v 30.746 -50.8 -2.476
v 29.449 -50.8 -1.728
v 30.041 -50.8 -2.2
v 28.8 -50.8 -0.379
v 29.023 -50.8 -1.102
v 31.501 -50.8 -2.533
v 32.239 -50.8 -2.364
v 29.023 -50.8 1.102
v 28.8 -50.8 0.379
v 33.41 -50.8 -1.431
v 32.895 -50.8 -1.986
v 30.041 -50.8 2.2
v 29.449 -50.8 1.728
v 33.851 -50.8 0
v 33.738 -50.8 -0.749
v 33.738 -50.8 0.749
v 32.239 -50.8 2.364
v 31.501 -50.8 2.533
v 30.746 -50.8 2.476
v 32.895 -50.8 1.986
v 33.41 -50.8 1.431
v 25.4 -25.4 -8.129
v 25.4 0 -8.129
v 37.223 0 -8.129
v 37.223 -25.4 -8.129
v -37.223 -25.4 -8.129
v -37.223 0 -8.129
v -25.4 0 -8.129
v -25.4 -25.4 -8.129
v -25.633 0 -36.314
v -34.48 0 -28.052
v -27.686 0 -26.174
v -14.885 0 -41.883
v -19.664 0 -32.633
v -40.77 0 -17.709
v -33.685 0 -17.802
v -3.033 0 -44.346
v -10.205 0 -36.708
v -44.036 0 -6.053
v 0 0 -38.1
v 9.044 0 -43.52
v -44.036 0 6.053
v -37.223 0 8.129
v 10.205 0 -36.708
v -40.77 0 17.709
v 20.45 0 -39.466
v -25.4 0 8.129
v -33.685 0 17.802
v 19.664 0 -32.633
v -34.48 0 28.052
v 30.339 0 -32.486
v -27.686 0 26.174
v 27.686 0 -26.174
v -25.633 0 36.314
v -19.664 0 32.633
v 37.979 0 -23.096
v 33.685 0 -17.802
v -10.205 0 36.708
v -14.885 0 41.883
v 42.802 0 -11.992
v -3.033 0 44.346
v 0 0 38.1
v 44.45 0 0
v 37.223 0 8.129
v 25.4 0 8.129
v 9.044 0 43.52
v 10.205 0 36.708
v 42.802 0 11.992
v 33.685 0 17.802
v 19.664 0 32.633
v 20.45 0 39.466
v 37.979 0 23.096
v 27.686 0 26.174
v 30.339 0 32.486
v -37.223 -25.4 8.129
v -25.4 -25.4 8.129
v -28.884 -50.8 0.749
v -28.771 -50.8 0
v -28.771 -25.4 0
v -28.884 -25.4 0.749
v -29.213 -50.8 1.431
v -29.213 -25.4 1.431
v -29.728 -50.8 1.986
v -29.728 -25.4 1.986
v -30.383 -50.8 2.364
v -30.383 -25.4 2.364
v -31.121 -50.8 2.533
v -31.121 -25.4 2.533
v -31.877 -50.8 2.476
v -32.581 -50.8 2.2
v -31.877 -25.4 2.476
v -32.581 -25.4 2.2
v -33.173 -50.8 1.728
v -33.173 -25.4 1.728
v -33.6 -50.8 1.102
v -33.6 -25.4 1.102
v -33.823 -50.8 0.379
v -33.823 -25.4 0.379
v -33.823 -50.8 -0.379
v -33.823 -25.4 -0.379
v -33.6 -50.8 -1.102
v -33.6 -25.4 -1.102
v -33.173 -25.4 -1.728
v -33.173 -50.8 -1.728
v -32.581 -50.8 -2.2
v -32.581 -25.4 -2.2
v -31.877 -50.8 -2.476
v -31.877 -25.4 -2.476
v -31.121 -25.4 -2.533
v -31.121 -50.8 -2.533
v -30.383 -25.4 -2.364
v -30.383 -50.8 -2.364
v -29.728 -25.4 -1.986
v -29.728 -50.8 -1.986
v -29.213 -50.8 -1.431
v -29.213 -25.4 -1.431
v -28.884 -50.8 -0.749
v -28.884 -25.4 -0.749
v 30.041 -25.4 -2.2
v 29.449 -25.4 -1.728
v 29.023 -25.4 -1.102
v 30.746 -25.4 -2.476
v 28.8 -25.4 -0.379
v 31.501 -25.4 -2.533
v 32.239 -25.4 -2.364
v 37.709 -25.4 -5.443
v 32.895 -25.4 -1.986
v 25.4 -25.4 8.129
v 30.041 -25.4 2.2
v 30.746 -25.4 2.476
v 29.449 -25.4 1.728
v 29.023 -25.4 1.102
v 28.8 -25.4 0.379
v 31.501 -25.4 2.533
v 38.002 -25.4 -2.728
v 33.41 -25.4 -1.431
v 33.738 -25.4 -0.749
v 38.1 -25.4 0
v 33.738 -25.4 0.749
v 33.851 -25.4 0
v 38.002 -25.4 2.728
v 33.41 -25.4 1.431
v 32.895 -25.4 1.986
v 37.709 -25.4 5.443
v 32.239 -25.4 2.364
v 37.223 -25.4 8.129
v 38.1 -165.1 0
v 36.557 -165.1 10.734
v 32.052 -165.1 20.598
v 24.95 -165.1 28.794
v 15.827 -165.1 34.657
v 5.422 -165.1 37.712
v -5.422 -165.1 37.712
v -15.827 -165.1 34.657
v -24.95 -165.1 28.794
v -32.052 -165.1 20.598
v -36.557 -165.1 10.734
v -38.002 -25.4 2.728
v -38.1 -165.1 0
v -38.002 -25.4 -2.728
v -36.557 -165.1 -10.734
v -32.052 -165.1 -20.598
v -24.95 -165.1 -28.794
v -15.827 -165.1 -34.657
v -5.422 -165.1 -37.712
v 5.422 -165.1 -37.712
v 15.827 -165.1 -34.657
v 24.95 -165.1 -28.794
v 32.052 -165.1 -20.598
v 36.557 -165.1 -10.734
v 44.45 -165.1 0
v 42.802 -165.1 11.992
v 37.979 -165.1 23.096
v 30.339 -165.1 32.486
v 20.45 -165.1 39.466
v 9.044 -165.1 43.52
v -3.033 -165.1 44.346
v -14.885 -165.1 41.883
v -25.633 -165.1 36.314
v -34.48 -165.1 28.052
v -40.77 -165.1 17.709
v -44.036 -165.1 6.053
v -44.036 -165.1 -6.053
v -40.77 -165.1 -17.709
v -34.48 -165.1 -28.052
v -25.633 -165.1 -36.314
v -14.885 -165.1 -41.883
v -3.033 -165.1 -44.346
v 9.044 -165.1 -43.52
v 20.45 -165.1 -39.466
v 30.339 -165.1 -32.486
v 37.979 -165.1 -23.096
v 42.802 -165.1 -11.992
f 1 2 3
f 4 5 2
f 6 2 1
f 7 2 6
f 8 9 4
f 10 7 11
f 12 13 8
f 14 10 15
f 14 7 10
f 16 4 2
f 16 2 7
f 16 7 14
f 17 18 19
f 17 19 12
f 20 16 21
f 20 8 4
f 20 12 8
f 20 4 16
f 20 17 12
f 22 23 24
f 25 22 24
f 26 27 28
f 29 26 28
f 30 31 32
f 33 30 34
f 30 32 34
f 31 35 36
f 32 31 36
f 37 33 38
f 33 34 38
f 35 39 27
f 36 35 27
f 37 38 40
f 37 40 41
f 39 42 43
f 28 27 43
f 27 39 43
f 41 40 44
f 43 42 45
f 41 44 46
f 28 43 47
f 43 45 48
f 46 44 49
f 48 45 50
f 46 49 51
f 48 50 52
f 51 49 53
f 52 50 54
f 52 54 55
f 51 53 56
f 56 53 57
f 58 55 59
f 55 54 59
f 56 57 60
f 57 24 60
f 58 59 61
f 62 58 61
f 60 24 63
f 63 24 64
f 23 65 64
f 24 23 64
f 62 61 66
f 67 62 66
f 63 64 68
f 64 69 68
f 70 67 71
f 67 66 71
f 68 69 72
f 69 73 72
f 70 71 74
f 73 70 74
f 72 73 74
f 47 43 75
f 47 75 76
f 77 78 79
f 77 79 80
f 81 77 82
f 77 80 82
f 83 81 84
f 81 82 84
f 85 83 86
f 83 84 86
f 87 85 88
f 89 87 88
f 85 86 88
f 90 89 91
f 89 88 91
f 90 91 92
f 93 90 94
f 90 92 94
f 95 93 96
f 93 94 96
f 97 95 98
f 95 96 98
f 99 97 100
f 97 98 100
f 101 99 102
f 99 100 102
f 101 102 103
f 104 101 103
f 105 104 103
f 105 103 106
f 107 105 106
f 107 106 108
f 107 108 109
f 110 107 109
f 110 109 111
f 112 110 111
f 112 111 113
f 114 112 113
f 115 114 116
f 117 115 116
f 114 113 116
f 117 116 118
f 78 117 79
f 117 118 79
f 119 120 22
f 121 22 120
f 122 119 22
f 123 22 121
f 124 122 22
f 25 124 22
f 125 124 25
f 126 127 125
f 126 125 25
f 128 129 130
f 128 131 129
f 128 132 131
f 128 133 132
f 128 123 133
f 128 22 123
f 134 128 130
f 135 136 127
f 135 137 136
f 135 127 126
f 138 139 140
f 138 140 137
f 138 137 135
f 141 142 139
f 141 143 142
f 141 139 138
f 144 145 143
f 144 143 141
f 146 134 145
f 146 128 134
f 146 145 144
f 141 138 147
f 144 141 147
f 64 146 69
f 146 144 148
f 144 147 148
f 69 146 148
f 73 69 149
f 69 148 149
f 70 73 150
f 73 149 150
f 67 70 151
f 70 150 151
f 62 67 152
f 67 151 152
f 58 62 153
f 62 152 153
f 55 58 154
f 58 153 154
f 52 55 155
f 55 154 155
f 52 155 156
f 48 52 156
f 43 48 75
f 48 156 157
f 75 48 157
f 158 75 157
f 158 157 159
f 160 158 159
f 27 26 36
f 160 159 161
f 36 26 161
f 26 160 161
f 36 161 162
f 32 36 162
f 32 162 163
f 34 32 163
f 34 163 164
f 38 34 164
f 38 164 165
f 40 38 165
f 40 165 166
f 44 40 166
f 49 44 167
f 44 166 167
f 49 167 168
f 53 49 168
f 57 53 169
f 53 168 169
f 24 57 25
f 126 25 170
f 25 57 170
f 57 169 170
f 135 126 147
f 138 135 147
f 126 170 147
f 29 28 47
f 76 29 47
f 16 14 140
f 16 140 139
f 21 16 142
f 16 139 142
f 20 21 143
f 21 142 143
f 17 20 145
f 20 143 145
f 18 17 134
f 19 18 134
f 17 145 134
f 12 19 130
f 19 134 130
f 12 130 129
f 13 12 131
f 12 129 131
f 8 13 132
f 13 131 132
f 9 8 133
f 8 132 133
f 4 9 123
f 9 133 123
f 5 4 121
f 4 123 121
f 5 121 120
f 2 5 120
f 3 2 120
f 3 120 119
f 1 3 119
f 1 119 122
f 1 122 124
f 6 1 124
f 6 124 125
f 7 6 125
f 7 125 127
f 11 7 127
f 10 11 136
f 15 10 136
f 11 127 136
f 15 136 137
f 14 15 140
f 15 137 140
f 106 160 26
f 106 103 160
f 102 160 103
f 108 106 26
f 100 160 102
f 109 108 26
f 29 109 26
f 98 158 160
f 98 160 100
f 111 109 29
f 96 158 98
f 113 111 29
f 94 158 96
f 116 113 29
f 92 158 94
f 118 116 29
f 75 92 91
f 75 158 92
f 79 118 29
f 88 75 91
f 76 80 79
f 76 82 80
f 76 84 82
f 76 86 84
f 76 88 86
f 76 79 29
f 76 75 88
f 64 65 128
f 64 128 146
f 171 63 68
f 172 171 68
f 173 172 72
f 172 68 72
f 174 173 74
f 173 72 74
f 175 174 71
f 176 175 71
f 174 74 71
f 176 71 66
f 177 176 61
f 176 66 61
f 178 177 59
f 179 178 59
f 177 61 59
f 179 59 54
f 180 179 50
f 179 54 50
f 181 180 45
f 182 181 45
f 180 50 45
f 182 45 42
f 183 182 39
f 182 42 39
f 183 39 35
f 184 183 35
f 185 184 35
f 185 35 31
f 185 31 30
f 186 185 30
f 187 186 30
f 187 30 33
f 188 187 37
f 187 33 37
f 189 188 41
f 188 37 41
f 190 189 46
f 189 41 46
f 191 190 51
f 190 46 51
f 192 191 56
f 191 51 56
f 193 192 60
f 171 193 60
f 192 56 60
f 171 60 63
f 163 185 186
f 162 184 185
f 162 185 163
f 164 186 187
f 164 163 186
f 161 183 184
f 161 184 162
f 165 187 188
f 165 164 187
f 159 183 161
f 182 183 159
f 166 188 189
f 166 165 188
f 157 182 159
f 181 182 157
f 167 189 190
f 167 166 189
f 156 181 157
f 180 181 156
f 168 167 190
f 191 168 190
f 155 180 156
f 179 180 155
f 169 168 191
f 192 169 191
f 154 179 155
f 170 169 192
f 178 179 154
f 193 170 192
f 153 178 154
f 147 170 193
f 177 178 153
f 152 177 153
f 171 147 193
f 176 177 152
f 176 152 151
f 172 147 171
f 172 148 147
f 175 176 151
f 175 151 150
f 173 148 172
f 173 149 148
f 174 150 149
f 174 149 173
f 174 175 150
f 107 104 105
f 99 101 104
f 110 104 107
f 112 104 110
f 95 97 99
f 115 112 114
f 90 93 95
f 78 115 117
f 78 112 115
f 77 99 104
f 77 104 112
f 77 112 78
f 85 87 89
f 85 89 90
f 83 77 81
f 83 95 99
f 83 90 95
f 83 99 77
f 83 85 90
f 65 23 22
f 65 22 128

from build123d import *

# Parameters (mm, degrees)
F0_R     = 44.45
F1_DEPTH = 165.1
F2_R     = 38.1
F3_DEPTH = 254
F4_W     = 86.713158
F4_H     = 16.258716
F5_DEPTH = 25.4
F6_W     = 50.8
F6_H     = 16.258716
F7_DEPTH = 25.4
F8_R     = 2.54
F9_DEPTH = 25.4


with BuildPart() as f1:
    # F0 (on Front) → F1 (new body)
    with BuildSketch(Plane.XZ):
        Circle(F0_R)
    extrude(amount=F1_DEPTH)

    # F2 (on face) → F3 (cut)
    with BuildSketch(Plane.XZ.offset(165.1)):
        Circle(F2_R)
    extrude(amount=-F3_DEPTH, mode=Mode.SUBTRACT)

    # F4 (on Front) → F5 (join)
    with BuildSketch(Plane.XZ):
        Rectangle(F4_W, F4_H)
    extrude(amount=F5_DEPTH)

    # F6 (on face) → F7 (cut)
    with BuildSketch(Plane(origin=(0, 0, 0), x_dir=(-1, 0, 0), z_dir=(0, 1, 0))):
        Rectangle(F6_W, F6_H)
    extrude(amount=-F7_DEPTH, mode=Mode.SUBTRACT)

    # F8 (on face) → F9 (join)
    with BuildSketch(Plane.XZ.offset(25.4)):
        with Locations((31.311311, 0)):
            Circle(F8_R)
        with Locations((-31.311311, 0)):
            Circle(F8_R)
    extrude(amount=F9_DEPTH)


solid = f1.part
